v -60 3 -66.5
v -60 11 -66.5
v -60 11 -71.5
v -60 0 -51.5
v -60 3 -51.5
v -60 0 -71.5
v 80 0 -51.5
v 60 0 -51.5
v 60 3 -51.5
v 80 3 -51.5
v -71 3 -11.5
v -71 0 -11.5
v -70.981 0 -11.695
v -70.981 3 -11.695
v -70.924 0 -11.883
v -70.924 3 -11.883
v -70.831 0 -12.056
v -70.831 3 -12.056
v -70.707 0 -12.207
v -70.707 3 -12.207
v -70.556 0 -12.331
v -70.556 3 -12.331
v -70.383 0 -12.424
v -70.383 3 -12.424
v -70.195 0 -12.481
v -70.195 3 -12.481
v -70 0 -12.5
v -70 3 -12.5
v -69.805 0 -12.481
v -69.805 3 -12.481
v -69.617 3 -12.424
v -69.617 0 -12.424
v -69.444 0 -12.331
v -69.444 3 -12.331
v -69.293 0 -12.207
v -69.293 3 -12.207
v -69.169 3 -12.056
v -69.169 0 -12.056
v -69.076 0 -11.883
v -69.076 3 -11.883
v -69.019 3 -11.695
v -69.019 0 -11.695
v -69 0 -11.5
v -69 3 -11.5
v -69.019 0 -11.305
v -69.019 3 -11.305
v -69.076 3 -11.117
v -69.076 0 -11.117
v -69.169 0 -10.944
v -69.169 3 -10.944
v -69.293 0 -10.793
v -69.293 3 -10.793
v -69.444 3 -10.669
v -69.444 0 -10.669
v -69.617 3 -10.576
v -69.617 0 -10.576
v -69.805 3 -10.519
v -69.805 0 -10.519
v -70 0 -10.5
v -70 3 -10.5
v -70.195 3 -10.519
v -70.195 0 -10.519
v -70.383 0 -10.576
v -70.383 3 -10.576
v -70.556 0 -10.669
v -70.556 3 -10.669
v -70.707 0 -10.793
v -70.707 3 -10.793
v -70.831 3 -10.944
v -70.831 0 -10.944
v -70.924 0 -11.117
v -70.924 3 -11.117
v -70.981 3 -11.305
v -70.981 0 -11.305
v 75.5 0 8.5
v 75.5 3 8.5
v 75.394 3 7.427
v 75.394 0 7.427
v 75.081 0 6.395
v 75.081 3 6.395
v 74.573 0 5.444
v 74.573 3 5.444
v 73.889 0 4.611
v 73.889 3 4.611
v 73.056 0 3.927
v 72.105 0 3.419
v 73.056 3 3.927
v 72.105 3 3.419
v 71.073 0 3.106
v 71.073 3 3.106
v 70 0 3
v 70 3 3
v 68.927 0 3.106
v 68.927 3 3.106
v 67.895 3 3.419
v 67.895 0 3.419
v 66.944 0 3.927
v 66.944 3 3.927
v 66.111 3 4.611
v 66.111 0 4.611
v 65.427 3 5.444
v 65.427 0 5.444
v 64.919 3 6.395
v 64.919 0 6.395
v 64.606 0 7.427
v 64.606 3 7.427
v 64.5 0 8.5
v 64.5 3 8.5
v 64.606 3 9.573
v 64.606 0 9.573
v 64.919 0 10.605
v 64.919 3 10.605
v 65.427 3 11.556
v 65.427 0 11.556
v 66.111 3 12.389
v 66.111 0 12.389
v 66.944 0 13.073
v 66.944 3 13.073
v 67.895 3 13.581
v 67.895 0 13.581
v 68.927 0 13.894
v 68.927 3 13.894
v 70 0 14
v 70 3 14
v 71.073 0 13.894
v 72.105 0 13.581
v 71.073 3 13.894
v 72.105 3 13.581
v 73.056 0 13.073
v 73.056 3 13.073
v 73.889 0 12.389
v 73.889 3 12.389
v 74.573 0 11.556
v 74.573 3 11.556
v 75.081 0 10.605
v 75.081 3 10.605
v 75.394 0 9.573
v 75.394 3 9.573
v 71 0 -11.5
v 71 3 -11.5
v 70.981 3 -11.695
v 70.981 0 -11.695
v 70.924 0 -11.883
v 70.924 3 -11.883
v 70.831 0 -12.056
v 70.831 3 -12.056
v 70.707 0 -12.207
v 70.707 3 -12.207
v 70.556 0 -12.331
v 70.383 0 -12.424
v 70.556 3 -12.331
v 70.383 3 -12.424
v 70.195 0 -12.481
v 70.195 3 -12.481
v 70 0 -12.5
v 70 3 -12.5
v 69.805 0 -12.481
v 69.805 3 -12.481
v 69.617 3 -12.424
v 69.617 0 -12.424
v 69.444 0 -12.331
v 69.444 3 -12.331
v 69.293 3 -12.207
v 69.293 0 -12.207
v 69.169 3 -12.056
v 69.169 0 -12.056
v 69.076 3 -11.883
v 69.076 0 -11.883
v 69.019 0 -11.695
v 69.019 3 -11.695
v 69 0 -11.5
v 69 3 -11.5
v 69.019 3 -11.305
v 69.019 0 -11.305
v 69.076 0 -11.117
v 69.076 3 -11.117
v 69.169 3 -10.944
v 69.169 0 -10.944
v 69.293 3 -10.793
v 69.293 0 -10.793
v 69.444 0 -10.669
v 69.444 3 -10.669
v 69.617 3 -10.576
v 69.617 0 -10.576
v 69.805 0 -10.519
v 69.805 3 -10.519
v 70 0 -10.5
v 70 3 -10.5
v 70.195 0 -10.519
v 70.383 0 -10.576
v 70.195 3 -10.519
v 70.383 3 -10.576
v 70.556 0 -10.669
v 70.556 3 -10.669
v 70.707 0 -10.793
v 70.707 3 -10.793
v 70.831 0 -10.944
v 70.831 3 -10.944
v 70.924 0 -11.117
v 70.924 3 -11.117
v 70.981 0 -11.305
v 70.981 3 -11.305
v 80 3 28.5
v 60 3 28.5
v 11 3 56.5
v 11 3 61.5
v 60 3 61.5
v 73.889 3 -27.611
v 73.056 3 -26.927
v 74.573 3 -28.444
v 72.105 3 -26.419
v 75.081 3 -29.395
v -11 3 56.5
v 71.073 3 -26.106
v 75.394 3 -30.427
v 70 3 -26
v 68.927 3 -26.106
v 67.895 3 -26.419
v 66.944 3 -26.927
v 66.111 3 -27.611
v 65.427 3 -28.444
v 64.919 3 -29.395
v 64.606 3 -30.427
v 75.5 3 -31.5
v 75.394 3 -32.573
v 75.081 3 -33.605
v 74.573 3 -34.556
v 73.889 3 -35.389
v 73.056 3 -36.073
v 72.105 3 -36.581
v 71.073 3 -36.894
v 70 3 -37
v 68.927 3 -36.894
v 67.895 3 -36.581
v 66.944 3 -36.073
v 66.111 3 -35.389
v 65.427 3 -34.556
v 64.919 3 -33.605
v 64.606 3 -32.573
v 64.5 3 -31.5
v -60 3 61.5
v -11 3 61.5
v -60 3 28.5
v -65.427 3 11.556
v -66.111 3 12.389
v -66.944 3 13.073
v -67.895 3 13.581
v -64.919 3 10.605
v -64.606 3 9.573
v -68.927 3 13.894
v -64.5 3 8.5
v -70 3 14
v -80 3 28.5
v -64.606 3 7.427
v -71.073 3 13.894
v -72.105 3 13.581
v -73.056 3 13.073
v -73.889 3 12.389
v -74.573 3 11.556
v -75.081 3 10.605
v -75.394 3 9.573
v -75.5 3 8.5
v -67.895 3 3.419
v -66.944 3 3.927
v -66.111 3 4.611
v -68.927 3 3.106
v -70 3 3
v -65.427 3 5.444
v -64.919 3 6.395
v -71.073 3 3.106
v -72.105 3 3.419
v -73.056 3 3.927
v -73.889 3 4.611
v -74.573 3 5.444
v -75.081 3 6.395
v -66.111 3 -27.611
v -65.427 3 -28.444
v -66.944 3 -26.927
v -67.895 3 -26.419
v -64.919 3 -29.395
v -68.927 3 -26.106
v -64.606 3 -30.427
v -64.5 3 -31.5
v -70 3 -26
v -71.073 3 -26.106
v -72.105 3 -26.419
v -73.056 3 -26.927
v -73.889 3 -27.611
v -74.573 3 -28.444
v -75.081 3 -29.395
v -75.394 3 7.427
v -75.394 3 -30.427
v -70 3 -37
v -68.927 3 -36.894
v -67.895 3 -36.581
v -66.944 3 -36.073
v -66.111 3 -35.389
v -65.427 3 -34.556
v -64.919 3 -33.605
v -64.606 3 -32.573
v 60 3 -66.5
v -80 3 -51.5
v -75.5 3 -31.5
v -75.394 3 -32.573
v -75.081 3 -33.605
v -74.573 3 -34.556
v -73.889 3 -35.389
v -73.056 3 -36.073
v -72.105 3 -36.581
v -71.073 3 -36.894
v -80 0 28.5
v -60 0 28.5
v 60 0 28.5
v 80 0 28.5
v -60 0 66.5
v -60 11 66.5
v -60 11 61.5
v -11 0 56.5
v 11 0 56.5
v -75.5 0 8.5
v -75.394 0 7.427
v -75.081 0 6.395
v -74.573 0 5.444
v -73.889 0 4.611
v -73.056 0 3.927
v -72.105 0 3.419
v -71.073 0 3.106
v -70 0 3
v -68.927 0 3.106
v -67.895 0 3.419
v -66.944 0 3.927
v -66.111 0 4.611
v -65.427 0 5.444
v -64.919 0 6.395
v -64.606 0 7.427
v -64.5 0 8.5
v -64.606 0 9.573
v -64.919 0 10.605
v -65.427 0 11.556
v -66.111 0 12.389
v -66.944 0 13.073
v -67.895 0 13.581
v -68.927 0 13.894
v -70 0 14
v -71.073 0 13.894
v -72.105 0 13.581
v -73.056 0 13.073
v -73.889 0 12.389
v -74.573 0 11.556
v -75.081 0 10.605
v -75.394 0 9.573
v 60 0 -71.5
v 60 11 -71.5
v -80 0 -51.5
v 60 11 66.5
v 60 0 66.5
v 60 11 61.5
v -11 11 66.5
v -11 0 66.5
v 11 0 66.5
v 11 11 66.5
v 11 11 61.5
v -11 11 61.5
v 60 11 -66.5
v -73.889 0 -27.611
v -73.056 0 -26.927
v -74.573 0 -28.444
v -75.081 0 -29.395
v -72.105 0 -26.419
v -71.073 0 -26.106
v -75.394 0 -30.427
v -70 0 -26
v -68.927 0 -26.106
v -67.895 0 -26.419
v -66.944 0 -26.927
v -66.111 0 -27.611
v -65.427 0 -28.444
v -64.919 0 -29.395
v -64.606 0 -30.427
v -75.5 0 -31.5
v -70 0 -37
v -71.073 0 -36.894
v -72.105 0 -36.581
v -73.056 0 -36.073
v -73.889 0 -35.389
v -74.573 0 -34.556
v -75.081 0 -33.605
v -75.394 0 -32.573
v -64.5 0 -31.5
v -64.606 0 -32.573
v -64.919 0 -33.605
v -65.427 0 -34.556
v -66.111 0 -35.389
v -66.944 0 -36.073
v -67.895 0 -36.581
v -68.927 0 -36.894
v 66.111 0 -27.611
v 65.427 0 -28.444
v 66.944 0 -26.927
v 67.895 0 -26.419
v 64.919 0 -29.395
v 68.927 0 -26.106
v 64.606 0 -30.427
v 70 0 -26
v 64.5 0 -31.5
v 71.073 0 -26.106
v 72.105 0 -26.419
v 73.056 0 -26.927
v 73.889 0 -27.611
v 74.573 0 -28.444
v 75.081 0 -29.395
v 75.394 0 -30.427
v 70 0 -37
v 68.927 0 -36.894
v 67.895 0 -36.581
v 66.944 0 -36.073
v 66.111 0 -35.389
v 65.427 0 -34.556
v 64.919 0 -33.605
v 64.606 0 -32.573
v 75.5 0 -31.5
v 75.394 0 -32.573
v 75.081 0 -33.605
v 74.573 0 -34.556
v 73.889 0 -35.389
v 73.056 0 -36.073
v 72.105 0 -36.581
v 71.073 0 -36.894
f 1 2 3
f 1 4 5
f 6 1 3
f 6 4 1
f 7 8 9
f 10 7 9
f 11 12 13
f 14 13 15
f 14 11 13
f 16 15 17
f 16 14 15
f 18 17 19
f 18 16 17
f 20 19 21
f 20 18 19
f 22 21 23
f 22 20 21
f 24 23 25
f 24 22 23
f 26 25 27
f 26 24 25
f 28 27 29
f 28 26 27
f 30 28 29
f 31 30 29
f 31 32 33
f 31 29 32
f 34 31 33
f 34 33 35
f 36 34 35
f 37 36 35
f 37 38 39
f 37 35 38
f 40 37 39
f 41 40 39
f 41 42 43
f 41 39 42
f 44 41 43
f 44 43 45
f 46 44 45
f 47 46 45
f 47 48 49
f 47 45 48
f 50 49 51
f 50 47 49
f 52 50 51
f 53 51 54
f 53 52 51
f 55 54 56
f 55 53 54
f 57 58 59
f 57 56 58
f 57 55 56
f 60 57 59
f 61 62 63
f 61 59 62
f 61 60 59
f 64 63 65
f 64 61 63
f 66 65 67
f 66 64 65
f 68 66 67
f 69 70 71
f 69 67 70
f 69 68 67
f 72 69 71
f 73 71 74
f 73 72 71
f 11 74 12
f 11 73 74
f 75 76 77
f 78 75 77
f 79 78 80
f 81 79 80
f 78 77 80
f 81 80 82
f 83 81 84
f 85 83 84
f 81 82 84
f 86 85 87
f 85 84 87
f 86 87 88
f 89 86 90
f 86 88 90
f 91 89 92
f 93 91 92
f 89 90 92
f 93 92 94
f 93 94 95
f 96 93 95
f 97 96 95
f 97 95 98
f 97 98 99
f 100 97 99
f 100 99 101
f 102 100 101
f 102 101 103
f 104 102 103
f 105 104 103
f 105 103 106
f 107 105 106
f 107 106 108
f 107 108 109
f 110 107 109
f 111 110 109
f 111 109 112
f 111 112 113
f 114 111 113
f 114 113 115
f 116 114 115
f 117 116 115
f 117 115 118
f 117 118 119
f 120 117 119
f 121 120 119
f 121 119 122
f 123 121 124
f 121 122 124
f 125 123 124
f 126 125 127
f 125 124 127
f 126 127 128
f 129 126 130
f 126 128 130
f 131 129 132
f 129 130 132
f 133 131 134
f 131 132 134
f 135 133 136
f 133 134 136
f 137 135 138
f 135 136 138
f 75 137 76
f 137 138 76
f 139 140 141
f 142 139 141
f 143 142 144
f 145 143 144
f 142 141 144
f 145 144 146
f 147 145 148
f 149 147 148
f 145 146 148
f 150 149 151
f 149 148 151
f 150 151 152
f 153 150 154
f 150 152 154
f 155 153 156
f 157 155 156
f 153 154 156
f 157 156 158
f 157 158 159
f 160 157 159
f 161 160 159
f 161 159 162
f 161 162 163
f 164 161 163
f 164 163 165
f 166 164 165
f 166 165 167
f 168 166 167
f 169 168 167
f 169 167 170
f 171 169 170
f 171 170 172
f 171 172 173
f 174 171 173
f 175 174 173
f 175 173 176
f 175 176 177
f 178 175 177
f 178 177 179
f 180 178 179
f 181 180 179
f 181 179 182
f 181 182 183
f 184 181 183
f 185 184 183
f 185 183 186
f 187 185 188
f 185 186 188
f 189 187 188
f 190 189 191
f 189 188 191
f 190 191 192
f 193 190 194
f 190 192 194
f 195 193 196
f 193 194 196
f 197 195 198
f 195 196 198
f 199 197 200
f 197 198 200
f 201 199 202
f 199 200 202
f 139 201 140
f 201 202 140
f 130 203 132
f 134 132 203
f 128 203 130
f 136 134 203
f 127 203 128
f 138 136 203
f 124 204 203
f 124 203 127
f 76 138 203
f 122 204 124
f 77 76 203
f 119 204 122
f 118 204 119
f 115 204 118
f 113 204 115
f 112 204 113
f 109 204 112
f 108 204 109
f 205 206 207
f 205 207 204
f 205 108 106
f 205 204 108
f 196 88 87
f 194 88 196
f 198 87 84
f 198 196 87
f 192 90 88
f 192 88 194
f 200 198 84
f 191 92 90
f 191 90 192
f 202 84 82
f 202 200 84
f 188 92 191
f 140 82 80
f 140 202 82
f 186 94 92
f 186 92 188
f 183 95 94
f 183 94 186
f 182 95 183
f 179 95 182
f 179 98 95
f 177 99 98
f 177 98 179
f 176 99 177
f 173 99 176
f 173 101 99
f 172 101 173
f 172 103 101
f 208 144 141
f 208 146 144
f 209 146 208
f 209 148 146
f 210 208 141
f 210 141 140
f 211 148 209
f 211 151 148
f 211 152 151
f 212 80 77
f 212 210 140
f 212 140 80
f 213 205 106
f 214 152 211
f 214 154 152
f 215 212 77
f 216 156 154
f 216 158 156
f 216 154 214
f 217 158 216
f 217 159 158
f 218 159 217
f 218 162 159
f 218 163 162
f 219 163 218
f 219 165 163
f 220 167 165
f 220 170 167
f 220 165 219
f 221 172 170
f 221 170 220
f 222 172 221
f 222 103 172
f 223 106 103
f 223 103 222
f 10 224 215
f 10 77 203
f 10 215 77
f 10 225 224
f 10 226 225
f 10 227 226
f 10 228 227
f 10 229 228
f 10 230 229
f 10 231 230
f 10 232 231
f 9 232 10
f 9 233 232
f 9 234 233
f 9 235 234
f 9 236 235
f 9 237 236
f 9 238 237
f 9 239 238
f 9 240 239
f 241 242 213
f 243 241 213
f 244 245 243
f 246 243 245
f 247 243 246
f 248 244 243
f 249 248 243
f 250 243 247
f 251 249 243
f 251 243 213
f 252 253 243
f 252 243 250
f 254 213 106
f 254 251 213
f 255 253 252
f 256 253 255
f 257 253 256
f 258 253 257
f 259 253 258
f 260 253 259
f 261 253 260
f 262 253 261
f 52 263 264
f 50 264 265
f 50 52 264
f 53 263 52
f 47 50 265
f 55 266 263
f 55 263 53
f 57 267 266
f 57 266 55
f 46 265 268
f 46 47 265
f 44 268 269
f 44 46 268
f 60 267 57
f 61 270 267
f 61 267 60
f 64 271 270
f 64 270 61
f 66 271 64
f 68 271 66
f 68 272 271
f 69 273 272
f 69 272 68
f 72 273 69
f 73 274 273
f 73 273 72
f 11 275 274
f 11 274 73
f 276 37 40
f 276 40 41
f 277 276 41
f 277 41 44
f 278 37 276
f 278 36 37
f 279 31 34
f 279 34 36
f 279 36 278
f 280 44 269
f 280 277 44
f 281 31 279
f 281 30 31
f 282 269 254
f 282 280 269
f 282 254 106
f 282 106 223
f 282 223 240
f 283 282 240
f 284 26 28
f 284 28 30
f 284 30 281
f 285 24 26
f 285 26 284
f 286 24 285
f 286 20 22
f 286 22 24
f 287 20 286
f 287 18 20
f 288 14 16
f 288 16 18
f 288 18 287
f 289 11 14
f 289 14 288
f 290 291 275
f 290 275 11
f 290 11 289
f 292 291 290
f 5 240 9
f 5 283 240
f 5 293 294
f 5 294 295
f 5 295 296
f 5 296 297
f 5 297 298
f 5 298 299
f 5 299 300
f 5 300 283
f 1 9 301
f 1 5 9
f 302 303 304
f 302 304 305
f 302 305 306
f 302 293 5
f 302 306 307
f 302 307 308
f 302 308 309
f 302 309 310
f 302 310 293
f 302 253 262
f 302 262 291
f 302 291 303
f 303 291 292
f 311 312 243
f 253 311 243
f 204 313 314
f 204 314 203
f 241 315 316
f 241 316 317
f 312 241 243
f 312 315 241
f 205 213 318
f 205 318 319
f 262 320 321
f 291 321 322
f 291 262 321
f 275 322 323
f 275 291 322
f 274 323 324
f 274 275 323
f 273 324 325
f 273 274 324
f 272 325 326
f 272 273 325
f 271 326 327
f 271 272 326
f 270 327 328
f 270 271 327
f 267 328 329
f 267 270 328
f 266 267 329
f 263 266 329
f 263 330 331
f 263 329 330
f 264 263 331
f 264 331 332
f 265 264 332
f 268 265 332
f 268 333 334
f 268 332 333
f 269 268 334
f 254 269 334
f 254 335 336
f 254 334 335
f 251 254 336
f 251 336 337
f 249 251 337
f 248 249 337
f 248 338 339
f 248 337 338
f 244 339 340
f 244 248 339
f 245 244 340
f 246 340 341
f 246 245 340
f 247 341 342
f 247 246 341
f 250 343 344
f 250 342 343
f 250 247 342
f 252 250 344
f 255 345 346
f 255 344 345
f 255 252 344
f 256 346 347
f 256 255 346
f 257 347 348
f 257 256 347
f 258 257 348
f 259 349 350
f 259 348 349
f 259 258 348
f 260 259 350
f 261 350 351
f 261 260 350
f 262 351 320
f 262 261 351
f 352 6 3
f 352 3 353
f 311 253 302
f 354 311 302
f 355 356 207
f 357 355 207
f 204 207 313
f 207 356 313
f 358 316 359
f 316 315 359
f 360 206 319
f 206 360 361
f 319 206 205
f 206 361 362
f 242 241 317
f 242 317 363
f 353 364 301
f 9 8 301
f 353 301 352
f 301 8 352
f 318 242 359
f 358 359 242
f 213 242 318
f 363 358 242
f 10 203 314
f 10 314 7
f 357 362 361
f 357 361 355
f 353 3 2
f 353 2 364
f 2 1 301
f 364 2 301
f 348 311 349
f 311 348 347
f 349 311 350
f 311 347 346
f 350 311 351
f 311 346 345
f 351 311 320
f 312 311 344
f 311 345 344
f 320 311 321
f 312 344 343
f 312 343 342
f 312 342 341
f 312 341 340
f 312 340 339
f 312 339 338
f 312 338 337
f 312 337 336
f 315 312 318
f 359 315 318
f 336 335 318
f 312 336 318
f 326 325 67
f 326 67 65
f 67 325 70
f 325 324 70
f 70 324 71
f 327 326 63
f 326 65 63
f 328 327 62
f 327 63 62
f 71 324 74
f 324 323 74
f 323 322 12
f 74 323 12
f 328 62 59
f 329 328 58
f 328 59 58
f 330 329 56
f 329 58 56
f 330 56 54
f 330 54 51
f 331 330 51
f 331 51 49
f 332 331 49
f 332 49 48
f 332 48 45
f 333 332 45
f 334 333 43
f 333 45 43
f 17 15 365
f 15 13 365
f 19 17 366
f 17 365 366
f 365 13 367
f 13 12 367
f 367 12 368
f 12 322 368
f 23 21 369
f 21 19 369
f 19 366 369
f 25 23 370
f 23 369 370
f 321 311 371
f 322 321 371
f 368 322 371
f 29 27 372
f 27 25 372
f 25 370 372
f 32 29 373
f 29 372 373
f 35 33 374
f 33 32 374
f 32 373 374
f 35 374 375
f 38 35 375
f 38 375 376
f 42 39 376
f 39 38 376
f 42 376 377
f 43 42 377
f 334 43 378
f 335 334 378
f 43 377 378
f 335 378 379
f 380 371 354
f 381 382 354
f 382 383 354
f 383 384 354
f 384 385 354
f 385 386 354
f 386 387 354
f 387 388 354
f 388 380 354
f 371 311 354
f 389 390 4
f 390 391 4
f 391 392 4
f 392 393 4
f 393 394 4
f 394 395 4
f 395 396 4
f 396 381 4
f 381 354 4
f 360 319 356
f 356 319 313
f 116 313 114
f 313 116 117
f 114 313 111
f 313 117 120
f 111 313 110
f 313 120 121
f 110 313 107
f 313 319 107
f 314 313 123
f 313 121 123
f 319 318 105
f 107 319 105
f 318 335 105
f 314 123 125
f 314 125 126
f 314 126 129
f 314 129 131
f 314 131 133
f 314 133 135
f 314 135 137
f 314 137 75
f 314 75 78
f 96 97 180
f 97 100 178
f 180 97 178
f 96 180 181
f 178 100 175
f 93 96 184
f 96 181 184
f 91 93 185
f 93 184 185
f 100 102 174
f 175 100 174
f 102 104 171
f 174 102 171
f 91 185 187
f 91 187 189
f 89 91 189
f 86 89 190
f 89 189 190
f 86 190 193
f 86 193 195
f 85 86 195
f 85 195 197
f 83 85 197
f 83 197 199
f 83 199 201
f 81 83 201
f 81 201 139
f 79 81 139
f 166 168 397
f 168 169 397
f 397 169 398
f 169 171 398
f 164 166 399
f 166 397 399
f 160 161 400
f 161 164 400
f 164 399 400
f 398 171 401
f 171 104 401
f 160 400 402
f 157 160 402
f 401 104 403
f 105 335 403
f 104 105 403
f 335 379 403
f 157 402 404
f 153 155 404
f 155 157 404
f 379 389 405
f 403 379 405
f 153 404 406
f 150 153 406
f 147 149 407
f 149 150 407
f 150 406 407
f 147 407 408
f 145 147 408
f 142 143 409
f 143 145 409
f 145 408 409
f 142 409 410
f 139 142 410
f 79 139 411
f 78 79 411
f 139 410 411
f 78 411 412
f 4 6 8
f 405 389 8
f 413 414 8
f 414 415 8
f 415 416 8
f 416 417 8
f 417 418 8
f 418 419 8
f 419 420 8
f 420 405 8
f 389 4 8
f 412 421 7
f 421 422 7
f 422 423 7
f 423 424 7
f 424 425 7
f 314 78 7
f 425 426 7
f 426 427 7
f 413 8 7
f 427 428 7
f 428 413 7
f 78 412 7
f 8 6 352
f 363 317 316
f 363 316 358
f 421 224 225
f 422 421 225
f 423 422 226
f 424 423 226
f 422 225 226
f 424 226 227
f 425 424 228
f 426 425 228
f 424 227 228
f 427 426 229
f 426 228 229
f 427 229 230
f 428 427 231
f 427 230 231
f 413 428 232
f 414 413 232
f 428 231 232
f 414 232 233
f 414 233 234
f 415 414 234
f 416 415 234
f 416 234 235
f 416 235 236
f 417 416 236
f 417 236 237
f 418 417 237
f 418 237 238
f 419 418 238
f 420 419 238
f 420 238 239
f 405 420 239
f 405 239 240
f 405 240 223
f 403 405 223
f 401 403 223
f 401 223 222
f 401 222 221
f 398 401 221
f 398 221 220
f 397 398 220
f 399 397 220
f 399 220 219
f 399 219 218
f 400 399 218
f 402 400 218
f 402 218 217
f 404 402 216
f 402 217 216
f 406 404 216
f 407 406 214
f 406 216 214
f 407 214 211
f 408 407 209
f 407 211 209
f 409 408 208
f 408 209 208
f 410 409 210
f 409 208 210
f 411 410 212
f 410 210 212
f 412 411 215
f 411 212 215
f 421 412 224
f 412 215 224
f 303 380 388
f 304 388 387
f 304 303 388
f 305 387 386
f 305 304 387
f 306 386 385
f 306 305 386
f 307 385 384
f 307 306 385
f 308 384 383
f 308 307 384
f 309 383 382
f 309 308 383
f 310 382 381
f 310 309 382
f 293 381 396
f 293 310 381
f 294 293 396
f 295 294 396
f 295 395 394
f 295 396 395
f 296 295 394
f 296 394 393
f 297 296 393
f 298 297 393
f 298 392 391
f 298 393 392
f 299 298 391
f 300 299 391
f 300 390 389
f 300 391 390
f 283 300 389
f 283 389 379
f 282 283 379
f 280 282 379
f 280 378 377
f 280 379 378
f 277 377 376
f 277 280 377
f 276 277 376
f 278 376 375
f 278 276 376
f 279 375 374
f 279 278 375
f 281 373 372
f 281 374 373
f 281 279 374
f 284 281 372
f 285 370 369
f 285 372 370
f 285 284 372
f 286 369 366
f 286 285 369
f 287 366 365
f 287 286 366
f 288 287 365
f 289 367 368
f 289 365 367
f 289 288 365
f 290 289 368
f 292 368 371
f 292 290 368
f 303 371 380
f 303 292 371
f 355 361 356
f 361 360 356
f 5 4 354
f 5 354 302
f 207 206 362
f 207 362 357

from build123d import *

# Parameters (mm, degrees)
SKETCH1_W               = 120
SKETCH1_H               = 133
BOSS_EXTRUDE1_DEPTH     = 3
SKETCH2_W               = 120
SKETCH2_H               = 5
BOSS_EXTRUDE2_DEPTH     = 8
SKETCH3_W               = 22
SKETCH3_H               = 10
CUT_EXTRUDE1_DEPTH      = 1
CUT_EXTRUDE1_DEPTH_BACK = 12
SKETCH4_W               = 120
SKETCH4_H               = 5
BOSS_EXTRUDE3_DEPTH     = 11
SKETCH5_W               = 80
SKETCH5_H               = 3
BOSS_EXTRUDE4_DEPTH     = 80
SKETCH6_R               = 1
SKETCH6_R_2             = 5.5
CUT_EXTRUDE2_DEPTH      = 80


with BuildPart() as part:
    # Sketch1 → Boss-Extrude1 (new body)
    with BuildSketch(Plane(origin=(0, 0, 0), x_dir=(1, 0, 0), z_dir=(0, 1, 0))):
        Rectangle(SKETCH1_W, SKETCH1_H)
    extrude(amount=BOSS_EXTRUDE1_DEPTH)

    # Sketch2 → Boss-Extrude2 (add)
    with BuildSketch(Plane(origin=(0, 3, 0), x_dir=(1, 0, 0), z_dir=(0, 1, 0))):
        with Locations((0, -64)):
            Rectangle(SKETCH2_W, SKETCH2_H)
    extrude(amount=BOSS_EXTRUDE2_DEPTH)

    # Sketch3 → Cut-Extrude1 (cut, two sides)
    with BuildSketch(Plane(origin=(0, 11, 0), x_dir=(1, 0, 0), z_dir=(0, 1, 0))) as cut_extrude1_sk:
        with Locations((0, -61.5)):
            Rectangle(SKETCH3_W, SKETCH3_H)
    extrude(amount=CUT_EXTRUDE1_DEPTH, mode=Mode.SUBTRACT)
    extrude(cut_extrude1_sk.sketch, amount=-CUT_EXTRUDE1_DEPTH_BACK, mode=Mode.SUBTRACT)

    # Sketch4 → Boss-Extrude3 (add)
    with BuildSketch(Plane(origin=(0, 0, 0), x_dir=(1, 0, 0), z_dir=(0, 1, 0))):
        with Locations((0, 69)):
            Rectangle(SKETCH4_W, SKETCH4_H)
    extrude(amount=BOSS_EXTRUDE3_DEPTH)

    # Sketch5 → Boss-Extrude4 (add)
    with BuildSketch(Plane(origin=(0, 0, 0), x_dir=(0, 0, -1), z_dir=(1, 0, 0))):
        with Locations((11.5, 1.5)):
            Rectangle(SKETCH5_W, SKETCH5_H)
    boss_extrude4 = extrude(amount=BOSS_EXTRUDE4_DEPTH)

    # Sketch6 → Cut-Extrude2 (cut)
    with BuildSketch(Plane(origin=(0, 3, 0), x_dir=(1, 0, 0), z_dir=(0, 1, 0))):
        with Locations((70, 11.5)):
            Circle(SKETCH6_R)
        with Locations((70, 31.5)):
            Circle(SKETCH6_R_2)
        with Locations((70, -8.5)):
            Circle(SKETCH6_R_2)
    cut_extrude2 = extrude(amount=-CUT_EXTRUDE2_DEPTH, mode=Mode.SUBTRACT)

    # Mirror1: Boss-Extrude4, Cut-Extrude2 across plane
    add(boss_extrude4.mirror(Plane(origin=(0, 0, 0), x_dir=(0, 0, 1), z_dir=(1, 0, 0))))
    add(cut_extrude2.mirror(Plane(origin=(0, 0, 0), x_dir=(0, 0, 1), z_dir=(1, 0, 0))), mode=Mode.SUBTRACT)


solid = part.part
